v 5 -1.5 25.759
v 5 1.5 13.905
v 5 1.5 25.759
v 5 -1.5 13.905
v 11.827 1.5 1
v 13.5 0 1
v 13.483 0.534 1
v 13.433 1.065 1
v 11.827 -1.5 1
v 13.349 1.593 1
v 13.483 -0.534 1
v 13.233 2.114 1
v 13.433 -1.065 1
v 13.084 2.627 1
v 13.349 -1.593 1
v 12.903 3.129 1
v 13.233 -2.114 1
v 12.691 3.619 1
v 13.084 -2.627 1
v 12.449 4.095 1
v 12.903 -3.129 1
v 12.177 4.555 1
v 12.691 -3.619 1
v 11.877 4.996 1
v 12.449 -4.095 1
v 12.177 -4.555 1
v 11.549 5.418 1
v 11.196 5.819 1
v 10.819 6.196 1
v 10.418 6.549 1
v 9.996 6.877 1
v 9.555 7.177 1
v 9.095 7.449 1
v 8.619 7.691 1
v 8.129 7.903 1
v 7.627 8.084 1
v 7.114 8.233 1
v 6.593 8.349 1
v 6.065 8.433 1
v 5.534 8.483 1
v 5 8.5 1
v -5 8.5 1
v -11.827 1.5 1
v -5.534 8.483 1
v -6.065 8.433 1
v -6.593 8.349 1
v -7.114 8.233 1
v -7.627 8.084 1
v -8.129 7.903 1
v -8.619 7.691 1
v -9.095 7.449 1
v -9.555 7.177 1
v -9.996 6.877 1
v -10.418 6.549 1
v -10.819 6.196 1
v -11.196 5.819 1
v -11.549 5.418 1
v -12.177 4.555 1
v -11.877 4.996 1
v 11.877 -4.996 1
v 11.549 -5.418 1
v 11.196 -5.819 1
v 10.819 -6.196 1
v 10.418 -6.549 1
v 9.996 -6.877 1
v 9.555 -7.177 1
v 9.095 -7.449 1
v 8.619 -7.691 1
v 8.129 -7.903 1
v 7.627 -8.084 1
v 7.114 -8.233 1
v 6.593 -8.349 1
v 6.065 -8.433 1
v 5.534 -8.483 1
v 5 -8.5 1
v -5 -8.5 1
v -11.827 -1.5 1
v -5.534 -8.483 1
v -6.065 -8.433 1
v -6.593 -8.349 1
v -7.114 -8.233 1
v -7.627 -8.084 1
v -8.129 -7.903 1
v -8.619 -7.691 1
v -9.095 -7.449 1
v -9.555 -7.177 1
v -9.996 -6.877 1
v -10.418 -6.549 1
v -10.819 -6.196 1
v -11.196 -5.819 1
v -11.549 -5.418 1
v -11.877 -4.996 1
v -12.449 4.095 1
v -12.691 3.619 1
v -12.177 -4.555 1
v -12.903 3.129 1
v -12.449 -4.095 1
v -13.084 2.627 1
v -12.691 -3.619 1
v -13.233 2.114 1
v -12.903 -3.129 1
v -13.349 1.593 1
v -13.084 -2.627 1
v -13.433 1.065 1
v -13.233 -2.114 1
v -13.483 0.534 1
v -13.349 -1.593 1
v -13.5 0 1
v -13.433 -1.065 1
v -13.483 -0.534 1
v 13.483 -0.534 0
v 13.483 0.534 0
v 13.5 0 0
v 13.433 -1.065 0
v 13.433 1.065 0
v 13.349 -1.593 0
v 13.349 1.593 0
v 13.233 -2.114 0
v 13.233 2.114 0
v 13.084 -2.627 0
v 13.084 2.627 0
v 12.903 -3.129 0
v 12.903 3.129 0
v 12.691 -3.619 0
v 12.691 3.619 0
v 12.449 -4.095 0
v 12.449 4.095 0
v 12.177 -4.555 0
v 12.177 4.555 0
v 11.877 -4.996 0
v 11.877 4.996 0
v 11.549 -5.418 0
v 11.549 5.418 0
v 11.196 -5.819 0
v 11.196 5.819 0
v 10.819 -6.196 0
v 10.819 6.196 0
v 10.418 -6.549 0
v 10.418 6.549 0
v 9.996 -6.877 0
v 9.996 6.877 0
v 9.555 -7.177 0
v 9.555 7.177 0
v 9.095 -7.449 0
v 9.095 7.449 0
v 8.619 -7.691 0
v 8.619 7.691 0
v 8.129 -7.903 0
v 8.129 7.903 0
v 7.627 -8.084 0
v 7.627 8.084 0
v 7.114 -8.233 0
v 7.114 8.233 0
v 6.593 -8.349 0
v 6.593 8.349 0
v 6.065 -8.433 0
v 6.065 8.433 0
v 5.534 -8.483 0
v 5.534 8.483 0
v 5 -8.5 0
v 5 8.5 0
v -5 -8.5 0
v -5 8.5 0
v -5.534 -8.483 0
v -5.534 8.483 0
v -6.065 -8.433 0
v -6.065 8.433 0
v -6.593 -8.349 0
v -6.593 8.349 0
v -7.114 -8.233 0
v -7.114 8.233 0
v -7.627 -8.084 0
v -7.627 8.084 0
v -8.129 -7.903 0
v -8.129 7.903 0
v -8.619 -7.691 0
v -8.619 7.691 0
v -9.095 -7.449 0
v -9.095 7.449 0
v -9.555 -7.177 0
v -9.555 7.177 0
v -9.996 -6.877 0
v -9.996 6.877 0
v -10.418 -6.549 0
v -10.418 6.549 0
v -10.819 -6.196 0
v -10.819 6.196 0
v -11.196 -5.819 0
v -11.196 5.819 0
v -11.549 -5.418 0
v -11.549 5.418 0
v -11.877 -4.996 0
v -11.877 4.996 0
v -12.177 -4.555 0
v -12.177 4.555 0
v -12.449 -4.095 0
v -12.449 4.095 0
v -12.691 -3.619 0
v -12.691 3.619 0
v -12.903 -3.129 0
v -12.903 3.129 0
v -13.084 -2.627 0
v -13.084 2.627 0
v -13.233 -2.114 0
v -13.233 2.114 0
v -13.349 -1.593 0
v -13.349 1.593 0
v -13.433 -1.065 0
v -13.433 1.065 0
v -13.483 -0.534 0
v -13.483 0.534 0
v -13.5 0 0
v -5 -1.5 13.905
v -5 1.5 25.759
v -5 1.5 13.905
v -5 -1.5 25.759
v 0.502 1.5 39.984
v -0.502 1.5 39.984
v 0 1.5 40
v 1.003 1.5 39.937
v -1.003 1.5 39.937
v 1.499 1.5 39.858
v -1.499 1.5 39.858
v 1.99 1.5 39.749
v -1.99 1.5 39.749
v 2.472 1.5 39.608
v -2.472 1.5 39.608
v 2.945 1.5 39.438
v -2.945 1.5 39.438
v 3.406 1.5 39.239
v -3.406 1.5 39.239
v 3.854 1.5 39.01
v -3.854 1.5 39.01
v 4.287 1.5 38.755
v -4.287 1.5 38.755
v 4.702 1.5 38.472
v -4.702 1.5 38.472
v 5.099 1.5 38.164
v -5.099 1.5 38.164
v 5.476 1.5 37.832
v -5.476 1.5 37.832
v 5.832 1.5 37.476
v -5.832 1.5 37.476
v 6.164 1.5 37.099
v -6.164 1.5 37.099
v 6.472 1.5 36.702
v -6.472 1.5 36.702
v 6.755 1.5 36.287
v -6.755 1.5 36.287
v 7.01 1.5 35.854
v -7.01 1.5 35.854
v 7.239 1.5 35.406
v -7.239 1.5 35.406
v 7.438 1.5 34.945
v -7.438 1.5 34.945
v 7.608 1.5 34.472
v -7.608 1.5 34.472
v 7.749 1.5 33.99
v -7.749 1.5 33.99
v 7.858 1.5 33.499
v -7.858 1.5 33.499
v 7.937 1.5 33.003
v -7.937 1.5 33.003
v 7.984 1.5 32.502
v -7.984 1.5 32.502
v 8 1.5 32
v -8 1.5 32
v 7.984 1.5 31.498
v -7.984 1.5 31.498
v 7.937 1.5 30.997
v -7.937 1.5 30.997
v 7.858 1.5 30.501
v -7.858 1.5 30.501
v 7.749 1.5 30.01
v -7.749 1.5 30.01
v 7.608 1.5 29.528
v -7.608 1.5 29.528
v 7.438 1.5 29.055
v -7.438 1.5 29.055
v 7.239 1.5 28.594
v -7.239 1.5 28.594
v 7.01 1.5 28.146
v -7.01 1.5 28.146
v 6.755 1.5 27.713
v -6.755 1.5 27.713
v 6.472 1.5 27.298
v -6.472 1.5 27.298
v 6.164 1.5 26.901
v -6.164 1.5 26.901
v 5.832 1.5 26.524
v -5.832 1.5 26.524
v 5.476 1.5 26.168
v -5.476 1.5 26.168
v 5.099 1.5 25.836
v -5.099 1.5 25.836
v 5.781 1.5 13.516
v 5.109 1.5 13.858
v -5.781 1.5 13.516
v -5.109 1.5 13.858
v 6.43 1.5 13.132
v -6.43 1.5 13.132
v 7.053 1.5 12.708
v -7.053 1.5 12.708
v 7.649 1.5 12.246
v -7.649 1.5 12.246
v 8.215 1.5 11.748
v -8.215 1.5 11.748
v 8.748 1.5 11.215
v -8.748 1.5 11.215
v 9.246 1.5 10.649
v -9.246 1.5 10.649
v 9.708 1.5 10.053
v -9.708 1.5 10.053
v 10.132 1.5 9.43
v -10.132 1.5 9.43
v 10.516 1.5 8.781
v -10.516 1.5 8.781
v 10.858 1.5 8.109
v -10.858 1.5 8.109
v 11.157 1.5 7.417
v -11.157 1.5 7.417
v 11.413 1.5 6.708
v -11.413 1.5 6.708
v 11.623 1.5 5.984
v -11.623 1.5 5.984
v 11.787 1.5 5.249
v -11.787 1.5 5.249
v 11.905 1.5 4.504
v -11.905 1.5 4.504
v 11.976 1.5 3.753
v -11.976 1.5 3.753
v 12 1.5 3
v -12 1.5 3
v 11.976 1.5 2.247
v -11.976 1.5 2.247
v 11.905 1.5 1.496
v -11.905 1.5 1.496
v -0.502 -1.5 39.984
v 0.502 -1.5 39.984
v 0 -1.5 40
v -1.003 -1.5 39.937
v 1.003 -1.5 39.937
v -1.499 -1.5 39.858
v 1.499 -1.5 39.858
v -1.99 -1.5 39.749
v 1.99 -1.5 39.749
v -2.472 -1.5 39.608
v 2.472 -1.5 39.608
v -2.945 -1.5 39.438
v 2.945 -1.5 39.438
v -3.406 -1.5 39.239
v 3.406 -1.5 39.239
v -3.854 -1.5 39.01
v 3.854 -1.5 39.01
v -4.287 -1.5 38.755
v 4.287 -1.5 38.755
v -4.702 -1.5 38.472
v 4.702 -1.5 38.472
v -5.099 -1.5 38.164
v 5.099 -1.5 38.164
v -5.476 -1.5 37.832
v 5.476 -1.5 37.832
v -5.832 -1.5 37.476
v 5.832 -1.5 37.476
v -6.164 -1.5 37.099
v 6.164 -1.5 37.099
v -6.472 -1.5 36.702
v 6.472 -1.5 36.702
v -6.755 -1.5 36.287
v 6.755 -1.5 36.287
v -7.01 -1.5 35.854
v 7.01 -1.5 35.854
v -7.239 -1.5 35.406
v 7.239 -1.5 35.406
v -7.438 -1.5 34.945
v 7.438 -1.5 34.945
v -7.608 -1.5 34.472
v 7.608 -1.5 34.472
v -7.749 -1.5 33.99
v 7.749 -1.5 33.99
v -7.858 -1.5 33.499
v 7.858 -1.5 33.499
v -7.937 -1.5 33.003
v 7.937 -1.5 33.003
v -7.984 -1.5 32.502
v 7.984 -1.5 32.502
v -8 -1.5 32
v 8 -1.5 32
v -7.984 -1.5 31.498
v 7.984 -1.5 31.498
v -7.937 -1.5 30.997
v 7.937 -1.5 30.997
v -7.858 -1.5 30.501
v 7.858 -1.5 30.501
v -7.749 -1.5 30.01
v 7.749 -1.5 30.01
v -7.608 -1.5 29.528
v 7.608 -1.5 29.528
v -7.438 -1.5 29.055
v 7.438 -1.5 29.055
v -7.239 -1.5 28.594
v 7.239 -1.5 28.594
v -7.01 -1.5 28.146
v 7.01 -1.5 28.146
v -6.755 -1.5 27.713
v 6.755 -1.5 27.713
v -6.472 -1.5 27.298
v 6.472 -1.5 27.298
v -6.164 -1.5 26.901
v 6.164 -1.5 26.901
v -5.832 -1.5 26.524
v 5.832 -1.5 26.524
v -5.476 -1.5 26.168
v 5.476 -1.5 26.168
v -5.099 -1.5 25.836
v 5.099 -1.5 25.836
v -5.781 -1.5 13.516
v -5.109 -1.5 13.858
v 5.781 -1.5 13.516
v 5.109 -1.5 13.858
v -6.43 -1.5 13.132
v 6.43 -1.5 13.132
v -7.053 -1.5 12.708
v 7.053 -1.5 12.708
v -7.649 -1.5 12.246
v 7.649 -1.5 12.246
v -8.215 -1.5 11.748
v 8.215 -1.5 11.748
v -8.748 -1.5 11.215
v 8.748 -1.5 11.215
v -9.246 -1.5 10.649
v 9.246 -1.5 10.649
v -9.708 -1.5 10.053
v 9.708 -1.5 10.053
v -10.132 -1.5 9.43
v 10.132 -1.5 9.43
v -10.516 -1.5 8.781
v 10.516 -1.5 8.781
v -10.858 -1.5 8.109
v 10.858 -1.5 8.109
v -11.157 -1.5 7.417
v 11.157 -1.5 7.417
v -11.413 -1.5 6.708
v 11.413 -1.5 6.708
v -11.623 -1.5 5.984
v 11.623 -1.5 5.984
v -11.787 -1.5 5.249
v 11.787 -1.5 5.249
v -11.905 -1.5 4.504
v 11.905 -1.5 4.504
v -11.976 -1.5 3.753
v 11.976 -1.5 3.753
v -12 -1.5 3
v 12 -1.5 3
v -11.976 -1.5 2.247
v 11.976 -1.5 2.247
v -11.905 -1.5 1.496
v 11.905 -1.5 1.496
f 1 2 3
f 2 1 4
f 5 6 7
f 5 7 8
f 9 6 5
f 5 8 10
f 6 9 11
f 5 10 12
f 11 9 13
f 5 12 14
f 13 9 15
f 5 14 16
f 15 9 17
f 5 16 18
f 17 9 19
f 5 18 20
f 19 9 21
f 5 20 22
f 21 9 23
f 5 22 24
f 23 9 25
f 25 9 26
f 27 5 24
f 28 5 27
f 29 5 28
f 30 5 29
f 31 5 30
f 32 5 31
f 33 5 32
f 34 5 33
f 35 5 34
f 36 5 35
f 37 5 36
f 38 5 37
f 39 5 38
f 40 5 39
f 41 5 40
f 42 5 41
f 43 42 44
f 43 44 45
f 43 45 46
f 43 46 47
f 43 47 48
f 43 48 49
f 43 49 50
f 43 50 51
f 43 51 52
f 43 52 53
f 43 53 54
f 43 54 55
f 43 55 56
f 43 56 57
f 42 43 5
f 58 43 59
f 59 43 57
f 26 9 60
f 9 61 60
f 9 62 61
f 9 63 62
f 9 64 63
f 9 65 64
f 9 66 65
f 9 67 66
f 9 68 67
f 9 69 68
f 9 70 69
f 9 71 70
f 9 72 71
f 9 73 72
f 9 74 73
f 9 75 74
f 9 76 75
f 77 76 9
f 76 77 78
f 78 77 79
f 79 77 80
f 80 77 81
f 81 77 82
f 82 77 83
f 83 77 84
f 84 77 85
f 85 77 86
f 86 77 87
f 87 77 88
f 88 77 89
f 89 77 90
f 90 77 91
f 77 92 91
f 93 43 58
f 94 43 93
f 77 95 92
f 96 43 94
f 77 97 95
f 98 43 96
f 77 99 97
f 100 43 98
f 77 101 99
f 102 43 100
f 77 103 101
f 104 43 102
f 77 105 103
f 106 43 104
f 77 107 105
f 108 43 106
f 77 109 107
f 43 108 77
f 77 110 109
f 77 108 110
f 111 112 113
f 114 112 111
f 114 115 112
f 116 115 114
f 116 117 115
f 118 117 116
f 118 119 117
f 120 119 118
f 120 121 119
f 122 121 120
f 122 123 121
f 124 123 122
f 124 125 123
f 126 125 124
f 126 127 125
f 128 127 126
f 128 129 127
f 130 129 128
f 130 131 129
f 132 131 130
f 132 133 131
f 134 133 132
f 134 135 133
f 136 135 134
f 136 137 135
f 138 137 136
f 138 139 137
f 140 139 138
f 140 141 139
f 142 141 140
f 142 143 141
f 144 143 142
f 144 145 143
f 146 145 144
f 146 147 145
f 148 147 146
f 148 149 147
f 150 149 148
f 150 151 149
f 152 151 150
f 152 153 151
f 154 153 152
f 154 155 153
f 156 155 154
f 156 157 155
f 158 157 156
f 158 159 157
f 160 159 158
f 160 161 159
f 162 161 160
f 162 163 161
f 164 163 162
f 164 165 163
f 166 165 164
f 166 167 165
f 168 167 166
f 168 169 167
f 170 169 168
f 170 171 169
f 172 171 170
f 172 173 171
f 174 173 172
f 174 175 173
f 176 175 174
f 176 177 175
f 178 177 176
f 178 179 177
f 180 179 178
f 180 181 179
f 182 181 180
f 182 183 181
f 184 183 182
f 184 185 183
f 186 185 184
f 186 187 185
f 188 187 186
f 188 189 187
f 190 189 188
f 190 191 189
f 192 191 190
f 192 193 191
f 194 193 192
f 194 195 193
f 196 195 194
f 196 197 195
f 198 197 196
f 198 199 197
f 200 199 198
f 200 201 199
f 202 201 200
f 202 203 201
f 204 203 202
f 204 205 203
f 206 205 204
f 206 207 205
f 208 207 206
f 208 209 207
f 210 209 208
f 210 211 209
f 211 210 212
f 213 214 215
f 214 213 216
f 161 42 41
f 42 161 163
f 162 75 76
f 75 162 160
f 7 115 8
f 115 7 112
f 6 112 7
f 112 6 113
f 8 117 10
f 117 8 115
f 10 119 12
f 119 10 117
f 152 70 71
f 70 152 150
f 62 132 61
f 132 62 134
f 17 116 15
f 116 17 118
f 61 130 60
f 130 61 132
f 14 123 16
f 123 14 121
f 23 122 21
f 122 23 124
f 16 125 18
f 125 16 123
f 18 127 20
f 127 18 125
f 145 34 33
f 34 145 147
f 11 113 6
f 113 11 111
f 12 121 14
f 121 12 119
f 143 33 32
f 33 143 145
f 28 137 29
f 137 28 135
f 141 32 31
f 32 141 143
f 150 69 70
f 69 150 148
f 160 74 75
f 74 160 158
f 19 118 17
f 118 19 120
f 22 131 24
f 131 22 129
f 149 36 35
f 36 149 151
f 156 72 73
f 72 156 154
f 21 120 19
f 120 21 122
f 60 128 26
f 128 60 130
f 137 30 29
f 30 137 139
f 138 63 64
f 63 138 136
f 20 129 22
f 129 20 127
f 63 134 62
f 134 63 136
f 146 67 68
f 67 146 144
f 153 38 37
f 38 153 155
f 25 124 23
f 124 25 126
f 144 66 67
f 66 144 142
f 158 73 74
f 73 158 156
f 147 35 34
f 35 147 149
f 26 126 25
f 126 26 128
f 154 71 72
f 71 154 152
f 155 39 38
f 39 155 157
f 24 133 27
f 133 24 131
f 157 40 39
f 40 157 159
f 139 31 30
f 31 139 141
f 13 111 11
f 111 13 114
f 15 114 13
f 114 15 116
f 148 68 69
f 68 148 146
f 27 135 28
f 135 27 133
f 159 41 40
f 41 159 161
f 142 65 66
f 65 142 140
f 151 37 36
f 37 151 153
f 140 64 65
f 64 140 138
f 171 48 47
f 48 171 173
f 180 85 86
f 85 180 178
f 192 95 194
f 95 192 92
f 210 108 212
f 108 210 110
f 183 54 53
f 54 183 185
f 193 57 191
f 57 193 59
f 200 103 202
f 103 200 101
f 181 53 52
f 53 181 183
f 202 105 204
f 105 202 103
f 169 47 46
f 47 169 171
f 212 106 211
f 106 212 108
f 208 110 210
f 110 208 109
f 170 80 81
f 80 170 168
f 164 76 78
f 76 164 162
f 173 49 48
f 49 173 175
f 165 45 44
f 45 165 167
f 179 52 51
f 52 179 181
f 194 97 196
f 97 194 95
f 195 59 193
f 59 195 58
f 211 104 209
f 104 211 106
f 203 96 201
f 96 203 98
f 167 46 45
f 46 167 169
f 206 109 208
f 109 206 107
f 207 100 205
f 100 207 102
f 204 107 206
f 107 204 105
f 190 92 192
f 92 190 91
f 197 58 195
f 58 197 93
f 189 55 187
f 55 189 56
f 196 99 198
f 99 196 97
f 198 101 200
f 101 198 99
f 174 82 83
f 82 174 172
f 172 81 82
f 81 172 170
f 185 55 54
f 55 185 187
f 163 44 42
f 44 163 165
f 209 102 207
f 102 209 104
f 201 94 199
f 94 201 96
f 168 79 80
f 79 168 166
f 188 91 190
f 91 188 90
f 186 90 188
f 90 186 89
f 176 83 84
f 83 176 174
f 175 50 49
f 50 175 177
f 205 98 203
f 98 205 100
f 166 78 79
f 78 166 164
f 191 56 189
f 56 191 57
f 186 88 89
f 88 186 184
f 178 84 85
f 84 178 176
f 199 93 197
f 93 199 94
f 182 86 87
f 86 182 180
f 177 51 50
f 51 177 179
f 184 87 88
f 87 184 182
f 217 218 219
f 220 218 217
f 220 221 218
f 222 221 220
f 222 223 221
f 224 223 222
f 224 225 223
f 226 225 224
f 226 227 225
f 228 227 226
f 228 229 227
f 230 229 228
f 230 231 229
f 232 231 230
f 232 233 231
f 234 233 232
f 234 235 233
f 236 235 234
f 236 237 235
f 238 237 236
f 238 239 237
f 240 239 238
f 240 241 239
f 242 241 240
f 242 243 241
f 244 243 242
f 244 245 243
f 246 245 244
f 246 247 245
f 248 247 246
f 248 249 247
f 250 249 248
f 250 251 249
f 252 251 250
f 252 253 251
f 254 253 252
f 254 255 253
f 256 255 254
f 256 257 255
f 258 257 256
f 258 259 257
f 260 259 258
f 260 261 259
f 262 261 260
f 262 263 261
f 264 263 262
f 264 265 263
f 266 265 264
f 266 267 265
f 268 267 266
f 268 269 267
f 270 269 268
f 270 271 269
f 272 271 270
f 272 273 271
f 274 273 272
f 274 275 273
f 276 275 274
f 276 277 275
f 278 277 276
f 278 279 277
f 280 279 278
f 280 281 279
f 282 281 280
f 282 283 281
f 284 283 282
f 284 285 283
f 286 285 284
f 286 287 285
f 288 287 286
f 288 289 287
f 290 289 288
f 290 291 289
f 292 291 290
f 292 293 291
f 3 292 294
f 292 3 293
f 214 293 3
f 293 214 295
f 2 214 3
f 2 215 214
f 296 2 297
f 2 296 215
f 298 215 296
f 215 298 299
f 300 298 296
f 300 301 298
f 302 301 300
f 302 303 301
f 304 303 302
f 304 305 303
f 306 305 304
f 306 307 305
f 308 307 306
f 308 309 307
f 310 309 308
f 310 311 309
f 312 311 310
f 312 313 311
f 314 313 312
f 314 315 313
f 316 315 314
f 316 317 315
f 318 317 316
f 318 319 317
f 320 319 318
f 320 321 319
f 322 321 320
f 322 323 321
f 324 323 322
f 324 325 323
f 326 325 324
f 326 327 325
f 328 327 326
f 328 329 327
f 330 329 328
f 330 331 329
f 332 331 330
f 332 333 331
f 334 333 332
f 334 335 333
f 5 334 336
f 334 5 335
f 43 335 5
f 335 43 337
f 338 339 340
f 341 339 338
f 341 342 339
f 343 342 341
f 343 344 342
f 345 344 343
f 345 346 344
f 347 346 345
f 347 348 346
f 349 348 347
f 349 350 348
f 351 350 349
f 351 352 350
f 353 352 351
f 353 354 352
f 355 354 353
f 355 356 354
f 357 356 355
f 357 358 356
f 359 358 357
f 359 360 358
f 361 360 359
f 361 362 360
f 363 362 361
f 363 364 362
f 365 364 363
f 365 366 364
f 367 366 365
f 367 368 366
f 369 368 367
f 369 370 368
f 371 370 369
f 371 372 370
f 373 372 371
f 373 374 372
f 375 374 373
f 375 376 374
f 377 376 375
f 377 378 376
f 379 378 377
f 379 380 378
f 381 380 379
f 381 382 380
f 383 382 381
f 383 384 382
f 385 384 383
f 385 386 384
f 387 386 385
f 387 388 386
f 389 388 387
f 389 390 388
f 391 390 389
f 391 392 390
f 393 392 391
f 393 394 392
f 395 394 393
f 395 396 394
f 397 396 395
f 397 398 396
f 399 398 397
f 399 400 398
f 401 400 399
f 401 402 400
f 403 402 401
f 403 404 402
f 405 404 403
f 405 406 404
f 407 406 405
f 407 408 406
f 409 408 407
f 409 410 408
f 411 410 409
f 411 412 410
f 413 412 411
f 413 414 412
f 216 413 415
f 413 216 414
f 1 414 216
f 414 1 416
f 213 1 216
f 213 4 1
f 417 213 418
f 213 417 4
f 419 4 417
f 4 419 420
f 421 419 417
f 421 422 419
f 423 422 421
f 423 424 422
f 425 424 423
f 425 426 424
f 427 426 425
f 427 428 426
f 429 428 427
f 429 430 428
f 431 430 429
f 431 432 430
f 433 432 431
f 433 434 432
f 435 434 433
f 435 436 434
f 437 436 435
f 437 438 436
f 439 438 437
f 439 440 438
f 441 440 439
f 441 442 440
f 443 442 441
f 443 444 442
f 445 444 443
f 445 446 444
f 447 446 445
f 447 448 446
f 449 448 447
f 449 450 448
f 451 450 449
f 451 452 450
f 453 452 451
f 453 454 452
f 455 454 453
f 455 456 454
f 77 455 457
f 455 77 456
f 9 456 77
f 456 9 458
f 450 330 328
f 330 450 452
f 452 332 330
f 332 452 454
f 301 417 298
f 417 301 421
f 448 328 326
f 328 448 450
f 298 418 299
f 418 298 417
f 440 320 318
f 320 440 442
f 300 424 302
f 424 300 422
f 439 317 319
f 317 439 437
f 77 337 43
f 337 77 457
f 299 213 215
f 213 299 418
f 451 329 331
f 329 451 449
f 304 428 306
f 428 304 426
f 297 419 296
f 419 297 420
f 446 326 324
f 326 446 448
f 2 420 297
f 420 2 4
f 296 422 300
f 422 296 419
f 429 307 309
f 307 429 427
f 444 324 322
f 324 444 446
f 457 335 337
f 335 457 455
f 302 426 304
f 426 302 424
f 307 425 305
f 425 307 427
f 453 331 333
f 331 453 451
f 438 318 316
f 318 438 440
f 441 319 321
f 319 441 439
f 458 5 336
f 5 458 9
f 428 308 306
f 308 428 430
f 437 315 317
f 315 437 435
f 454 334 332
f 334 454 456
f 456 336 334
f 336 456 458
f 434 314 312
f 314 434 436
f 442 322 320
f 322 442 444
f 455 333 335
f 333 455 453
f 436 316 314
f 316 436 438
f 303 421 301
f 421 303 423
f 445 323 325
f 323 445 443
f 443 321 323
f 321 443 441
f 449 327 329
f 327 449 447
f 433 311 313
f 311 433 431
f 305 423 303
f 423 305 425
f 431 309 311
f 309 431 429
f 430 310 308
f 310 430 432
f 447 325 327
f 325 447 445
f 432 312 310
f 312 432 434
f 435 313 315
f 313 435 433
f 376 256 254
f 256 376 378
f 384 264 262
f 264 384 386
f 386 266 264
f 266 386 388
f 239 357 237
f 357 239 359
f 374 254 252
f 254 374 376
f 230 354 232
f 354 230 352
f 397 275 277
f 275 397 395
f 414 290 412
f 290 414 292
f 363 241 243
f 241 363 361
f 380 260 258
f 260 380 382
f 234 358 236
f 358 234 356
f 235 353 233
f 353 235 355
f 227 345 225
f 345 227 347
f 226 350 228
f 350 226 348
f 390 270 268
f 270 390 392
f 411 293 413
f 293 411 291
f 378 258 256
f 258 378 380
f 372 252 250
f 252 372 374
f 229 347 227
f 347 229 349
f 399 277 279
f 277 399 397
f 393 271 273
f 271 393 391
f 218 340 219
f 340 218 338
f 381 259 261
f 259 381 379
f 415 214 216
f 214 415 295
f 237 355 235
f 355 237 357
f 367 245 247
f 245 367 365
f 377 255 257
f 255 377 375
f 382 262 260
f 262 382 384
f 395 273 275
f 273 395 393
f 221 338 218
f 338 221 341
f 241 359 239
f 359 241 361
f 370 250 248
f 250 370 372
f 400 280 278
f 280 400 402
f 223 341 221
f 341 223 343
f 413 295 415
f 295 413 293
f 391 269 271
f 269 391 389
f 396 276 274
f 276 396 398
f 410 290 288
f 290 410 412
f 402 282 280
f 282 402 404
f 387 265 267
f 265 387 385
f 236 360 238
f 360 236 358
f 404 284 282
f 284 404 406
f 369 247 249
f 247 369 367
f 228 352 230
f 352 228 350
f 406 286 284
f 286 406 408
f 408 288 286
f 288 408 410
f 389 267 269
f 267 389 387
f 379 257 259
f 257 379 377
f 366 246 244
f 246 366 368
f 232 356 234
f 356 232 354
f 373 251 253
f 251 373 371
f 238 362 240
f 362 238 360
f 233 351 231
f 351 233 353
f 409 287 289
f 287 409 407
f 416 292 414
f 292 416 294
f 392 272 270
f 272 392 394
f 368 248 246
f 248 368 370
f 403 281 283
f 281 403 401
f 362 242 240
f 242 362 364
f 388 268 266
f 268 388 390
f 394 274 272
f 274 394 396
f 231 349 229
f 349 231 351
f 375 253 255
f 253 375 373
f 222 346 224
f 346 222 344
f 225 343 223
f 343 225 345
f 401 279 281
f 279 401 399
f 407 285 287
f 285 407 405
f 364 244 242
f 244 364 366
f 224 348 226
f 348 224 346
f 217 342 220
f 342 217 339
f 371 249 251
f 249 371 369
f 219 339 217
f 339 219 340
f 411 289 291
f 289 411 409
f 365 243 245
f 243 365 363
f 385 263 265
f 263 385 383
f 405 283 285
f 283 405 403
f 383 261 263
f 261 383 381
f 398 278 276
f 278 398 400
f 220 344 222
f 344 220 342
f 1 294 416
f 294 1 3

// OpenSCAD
difference(){
	union(){ 

        translate([-5, -8.5,0]){
           cube([10,17,1], center=false);
        }                
        translate([0+5,0,0]){
            rotate([0,0,0]){
                cylinder(h=1, r=8.5, $fn=100, center=false);
            }   
        }
        translate([0-5,0,0]){
            rotate([0,0,0]){
                cylinder(h=1, r=8.5, $fn=100, center=false);
            }   
        }
        translate([-5, -1.5,0]){
           cube([10,3,30], center=false);
        }                
        translate([0,1.5,3]){
            rotate([90,0,0]){
                cylinder(h=3, r=12, $fn=100, center=false);
            }   
        }
        translate([0,1.5,32]){
            rotate([90,0,0]){
                cylinder(h=3, r=8, $fn=100, center=false);
            }   
        }





	}
	union() {
        translate([-40, -40,-20]){
           cube([80,80,20], center=false);
        }                

	}
}
